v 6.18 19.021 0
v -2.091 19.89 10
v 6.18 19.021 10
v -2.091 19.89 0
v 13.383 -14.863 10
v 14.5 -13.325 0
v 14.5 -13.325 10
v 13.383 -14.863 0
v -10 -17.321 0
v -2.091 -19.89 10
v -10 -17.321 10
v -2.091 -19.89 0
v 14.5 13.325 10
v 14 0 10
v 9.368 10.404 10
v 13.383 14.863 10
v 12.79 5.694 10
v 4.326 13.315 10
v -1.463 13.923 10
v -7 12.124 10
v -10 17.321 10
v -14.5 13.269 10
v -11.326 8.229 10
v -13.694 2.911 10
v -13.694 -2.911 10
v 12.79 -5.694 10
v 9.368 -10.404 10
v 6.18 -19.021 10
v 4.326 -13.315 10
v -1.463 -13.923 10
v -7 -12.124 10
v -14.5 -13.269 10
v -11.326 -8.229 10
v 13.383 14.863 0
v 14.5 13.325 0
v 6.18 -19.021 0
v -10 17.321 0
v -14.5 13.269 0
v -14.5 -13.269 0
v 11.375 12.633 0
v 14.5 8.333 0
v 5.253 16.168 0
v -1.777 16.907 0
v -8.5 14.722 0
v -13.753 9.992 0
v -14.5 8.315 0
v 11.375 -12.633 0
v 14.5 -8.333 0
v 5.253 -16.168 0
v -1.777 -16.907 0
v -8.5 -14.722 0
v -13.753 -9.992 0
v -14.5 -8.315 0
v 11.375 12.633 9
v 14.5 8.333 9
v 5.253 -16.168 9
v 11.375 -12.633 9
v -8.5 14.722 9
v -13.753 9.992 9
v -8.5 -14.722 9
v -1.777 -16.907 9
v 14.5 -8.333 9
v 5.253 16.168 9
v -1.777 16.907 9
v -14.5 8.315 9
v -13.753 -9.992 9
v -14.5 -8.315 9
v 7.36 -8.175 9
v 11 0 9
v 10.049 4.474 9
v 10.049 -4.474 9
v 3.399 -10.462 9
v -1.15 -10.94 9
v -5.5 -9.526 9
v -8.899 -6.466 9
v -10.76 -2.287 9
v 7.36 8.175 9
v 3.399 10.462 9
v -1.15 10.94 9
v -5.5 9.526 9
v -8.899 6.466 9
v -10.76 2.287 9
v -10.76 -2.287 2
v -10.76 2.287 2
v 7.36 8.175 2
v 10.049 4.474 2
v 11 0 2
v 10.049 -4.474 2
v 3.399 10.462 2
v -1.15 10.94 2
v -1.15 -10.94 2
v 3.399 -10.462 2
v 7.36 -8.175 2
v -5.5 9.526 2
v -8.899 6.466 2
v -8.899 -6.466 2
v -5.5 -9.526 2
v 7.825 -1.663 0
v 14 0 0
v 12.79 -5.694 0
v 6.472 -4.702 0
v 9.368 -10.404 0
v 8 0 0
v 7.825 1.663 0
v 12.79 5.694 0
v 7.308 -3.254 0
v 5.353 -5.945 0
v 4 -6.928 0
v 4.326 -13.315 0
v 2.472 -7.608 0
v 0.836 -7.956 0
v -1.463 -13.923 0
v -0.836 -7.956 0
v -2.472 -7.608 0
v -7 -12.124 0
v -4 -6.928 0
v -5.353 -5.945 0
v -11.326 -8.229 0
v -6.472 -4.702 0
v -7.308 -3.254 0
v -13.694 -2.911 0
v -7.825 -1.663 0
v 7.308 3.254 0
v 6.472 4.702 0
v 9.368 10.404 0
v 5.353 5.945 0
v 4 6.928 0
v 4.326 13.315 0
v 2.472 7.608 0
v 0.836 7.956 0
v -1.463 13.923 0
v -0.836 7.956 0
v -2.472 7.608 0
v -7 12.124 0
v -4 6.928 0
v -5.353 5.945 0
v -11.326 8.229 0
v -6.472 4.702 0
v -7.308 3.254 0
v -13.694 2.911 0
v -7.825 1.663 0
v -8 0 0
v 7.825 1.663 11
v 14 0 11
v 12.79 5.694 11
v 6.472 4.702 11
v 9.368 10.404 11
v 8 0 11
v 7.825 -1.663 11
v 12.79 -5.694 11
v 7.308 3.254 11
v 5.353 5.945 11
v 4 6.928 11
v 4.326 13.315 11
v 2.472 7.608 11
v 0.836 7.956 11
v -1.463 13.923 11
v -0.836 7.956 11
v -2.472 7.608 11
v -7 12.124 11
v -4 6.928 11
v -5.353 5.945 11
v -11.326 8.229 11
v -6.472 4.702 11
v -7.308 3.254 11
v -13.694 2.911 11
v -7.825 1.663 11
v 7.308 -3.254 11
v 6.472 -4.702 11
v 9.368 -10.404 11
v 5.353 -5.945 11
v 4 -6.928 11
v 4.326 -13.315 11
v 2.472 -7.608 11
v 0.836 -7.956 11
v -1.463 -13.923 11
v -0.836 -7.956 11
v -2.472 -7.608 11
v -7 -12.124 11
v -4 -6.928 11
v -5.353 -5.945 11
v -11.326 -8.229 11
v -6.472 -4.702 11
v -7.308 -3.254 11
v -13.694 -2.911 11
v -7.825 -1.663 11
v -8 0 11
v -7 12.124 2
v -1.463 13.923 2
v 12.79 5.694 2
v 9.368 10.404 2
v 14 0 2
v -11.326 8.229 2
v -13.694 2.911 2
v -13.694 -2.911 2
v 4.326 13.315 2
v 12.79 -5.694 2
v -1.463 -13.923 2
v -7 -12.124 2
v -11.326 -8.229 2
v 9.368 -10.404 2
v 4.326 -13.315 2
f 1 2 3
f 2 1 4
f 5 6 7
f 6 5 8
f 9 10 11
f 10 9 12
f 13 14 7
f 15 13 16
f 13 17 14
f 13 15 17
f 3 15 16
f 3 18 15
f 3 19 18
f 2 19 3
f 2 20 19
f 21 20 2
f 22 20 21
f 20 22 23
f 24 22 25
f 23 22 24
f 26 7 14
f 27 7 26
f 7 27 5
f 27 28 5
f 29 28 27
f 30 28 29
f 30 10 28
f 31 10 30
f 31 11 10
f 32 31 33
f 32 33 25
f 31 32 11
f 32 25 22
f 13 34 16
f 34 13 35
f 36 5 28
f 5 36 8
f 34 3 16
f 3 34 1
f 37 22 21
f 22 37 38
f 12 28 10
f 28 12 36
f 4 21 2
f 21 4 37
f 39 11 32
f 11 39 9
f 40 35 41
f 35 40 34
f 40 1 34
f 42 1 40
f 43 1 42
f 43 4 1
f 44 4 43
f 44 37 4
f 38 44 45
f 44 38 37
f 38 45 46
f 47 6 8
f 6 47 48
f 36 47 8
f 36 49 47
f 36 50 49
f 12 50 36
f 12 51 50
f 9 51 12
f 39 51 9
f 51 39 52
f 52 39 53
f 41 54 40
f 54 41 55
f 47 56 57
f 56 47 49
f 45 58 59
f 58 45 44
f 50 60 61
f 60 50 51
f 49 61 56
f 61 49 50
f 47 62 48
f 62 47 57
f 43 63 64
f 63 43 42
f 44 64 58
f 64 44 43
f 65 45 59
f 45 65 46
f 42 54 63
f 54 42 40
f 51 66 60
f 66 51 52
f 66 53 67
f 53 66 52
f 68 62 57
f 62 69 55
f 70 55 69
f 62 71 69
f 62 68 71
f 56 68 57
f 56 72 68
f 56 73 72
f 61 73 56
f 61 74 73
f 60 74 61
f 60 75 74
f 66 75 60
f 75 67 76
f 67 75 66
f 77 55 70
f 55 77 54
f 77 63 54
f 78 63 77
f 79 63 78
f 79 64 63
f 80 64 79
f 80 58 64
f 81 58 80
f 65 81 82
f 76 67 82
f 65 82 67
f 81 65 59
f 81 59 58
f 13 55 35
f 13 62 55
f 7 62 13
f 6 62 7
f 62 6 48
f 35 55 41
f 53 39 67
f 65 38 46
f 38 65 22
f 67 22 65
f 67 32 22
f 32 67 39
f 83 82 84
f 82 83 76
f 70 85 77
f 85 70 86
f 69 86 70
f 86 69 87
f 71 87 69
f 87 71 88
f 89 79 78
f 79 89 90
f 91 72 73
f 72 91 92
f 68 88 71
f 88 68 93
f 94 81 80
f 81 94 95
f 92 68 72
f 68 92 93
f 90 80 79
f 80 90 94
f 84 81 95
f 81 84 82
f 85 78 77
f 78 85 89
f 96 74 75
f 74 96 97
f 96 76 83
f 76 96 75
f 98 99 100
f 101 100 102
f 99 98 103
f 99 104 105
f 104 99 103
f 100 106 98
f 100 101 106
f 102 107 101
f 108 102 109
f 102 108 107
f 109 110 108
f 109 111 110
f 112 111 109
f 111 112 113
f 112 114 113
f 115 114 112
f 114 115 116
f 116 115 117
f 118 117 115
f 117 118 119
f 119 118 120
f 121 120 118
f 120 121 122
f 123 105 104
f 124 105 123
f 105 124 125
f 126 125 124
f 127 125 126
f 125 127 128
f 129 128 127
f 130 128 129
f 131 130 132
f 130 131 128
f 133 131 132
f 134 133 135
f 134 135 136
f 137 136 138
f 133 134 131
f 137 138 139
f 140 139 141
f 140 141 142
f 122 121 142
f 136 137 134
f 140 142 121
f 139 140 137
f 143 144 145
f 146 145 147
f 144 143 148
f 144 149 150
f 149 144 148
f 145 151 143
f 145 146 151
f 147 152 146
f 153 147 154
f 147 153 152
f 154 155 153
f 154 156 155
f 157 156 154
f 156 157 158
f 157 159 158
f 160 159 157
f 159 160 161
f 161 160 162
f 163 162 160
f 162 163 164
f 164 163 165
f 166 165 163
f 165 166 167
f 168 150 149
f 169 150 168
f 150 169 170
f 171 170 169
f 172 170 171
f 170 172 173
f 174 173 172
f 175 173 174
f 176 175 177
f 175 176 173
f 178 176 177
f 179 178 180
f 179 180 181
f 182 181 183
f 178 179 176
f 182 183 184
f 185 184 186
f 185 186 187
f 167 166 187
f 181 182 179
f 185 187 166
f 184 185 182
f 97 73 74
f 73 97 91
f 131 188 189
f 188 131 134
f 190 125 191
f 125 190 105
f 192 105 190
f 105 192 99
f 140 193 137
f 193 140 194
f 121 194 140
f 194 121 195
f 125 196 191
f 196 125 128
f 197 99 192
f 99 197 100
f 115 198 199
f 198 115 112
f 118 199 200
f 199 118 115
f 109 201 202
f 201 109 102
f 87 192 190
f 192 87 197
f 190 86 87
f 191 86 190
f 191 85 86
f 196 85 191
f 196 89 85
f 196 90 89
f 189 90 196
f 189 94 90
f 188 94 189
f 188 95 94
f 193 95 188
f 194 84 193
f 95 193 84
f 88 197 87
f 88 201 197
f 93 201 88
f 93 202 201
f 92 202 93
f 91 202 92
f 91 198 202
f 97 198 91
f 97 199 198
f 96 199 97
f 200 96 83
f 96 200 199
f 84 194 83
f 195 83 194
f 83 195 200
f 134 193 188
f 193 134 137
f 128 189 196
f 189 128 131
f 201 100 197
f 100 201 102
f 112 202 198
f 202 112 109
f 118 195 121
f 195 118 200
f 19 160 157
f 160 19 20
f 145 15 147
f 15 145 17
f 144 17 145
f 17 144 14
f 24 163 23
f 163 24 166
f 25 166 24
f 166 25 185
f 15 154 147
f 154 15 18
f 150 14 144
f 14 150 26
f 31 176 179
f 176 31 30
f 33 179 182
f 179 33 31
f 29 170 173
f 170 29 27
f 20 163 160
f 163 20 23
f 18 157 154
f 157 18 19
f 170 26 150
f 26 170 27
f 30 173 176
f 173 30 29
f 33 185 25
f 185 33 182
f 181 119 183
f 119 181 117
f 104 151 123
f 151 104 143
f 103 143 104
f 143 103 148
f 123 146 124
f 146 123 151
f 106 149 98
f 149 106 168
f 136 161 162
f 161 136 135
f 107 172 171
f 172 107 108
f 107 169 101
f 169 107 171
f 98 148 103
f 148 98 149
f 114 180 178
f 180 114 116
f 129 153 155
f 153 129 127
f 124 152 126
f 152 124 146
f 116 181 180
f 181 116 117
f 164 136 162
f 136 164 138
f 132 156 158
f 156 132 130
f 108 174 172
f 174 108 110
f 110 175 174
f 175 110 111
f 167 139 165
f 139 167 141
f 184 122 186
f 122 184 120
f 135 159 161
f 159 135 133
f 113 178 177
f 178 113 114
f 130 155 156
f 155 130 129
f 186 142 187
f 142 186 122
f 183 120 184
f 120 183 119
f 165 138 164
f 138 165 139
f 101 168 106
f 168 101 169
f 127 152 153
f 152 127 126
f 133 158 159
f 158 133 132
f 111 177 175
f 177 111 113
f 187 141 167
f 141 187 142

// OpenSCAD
difference(){
union(){
translate(v = [0, 0, 5.5]) cylinder(h = 11, r=11, $fn=15, center=true);
translate(v = [0, 0, 1]) cylinder(h = 2, r=14, $fn=15, center=true);
translate(v = [0, 0, 10]) cylinder(h = 2, r=14, $fn=15, center=true);

//support shell
intersection(){
	union(){
	difference(){
		translate(v = [0, 0, 5]) cylinder(h = 10, r=20, $fn=15, center=true);
		translate(v = [0, 0, 6]) cylinder(h = 15, r=17, $fn=15, center=true);
	}
	translate(v = [0, 0, 9.5]) cylinder(h = 1, r=20, $fn=15, center=true);
	}
	translate(v = [0, 0, 10])cube(size = [29,50,20], center = true);
}
}
translate(v = [0, 0, 5.5]) cylinder(h = 20, r=8, $fn=30, center=true);
}
